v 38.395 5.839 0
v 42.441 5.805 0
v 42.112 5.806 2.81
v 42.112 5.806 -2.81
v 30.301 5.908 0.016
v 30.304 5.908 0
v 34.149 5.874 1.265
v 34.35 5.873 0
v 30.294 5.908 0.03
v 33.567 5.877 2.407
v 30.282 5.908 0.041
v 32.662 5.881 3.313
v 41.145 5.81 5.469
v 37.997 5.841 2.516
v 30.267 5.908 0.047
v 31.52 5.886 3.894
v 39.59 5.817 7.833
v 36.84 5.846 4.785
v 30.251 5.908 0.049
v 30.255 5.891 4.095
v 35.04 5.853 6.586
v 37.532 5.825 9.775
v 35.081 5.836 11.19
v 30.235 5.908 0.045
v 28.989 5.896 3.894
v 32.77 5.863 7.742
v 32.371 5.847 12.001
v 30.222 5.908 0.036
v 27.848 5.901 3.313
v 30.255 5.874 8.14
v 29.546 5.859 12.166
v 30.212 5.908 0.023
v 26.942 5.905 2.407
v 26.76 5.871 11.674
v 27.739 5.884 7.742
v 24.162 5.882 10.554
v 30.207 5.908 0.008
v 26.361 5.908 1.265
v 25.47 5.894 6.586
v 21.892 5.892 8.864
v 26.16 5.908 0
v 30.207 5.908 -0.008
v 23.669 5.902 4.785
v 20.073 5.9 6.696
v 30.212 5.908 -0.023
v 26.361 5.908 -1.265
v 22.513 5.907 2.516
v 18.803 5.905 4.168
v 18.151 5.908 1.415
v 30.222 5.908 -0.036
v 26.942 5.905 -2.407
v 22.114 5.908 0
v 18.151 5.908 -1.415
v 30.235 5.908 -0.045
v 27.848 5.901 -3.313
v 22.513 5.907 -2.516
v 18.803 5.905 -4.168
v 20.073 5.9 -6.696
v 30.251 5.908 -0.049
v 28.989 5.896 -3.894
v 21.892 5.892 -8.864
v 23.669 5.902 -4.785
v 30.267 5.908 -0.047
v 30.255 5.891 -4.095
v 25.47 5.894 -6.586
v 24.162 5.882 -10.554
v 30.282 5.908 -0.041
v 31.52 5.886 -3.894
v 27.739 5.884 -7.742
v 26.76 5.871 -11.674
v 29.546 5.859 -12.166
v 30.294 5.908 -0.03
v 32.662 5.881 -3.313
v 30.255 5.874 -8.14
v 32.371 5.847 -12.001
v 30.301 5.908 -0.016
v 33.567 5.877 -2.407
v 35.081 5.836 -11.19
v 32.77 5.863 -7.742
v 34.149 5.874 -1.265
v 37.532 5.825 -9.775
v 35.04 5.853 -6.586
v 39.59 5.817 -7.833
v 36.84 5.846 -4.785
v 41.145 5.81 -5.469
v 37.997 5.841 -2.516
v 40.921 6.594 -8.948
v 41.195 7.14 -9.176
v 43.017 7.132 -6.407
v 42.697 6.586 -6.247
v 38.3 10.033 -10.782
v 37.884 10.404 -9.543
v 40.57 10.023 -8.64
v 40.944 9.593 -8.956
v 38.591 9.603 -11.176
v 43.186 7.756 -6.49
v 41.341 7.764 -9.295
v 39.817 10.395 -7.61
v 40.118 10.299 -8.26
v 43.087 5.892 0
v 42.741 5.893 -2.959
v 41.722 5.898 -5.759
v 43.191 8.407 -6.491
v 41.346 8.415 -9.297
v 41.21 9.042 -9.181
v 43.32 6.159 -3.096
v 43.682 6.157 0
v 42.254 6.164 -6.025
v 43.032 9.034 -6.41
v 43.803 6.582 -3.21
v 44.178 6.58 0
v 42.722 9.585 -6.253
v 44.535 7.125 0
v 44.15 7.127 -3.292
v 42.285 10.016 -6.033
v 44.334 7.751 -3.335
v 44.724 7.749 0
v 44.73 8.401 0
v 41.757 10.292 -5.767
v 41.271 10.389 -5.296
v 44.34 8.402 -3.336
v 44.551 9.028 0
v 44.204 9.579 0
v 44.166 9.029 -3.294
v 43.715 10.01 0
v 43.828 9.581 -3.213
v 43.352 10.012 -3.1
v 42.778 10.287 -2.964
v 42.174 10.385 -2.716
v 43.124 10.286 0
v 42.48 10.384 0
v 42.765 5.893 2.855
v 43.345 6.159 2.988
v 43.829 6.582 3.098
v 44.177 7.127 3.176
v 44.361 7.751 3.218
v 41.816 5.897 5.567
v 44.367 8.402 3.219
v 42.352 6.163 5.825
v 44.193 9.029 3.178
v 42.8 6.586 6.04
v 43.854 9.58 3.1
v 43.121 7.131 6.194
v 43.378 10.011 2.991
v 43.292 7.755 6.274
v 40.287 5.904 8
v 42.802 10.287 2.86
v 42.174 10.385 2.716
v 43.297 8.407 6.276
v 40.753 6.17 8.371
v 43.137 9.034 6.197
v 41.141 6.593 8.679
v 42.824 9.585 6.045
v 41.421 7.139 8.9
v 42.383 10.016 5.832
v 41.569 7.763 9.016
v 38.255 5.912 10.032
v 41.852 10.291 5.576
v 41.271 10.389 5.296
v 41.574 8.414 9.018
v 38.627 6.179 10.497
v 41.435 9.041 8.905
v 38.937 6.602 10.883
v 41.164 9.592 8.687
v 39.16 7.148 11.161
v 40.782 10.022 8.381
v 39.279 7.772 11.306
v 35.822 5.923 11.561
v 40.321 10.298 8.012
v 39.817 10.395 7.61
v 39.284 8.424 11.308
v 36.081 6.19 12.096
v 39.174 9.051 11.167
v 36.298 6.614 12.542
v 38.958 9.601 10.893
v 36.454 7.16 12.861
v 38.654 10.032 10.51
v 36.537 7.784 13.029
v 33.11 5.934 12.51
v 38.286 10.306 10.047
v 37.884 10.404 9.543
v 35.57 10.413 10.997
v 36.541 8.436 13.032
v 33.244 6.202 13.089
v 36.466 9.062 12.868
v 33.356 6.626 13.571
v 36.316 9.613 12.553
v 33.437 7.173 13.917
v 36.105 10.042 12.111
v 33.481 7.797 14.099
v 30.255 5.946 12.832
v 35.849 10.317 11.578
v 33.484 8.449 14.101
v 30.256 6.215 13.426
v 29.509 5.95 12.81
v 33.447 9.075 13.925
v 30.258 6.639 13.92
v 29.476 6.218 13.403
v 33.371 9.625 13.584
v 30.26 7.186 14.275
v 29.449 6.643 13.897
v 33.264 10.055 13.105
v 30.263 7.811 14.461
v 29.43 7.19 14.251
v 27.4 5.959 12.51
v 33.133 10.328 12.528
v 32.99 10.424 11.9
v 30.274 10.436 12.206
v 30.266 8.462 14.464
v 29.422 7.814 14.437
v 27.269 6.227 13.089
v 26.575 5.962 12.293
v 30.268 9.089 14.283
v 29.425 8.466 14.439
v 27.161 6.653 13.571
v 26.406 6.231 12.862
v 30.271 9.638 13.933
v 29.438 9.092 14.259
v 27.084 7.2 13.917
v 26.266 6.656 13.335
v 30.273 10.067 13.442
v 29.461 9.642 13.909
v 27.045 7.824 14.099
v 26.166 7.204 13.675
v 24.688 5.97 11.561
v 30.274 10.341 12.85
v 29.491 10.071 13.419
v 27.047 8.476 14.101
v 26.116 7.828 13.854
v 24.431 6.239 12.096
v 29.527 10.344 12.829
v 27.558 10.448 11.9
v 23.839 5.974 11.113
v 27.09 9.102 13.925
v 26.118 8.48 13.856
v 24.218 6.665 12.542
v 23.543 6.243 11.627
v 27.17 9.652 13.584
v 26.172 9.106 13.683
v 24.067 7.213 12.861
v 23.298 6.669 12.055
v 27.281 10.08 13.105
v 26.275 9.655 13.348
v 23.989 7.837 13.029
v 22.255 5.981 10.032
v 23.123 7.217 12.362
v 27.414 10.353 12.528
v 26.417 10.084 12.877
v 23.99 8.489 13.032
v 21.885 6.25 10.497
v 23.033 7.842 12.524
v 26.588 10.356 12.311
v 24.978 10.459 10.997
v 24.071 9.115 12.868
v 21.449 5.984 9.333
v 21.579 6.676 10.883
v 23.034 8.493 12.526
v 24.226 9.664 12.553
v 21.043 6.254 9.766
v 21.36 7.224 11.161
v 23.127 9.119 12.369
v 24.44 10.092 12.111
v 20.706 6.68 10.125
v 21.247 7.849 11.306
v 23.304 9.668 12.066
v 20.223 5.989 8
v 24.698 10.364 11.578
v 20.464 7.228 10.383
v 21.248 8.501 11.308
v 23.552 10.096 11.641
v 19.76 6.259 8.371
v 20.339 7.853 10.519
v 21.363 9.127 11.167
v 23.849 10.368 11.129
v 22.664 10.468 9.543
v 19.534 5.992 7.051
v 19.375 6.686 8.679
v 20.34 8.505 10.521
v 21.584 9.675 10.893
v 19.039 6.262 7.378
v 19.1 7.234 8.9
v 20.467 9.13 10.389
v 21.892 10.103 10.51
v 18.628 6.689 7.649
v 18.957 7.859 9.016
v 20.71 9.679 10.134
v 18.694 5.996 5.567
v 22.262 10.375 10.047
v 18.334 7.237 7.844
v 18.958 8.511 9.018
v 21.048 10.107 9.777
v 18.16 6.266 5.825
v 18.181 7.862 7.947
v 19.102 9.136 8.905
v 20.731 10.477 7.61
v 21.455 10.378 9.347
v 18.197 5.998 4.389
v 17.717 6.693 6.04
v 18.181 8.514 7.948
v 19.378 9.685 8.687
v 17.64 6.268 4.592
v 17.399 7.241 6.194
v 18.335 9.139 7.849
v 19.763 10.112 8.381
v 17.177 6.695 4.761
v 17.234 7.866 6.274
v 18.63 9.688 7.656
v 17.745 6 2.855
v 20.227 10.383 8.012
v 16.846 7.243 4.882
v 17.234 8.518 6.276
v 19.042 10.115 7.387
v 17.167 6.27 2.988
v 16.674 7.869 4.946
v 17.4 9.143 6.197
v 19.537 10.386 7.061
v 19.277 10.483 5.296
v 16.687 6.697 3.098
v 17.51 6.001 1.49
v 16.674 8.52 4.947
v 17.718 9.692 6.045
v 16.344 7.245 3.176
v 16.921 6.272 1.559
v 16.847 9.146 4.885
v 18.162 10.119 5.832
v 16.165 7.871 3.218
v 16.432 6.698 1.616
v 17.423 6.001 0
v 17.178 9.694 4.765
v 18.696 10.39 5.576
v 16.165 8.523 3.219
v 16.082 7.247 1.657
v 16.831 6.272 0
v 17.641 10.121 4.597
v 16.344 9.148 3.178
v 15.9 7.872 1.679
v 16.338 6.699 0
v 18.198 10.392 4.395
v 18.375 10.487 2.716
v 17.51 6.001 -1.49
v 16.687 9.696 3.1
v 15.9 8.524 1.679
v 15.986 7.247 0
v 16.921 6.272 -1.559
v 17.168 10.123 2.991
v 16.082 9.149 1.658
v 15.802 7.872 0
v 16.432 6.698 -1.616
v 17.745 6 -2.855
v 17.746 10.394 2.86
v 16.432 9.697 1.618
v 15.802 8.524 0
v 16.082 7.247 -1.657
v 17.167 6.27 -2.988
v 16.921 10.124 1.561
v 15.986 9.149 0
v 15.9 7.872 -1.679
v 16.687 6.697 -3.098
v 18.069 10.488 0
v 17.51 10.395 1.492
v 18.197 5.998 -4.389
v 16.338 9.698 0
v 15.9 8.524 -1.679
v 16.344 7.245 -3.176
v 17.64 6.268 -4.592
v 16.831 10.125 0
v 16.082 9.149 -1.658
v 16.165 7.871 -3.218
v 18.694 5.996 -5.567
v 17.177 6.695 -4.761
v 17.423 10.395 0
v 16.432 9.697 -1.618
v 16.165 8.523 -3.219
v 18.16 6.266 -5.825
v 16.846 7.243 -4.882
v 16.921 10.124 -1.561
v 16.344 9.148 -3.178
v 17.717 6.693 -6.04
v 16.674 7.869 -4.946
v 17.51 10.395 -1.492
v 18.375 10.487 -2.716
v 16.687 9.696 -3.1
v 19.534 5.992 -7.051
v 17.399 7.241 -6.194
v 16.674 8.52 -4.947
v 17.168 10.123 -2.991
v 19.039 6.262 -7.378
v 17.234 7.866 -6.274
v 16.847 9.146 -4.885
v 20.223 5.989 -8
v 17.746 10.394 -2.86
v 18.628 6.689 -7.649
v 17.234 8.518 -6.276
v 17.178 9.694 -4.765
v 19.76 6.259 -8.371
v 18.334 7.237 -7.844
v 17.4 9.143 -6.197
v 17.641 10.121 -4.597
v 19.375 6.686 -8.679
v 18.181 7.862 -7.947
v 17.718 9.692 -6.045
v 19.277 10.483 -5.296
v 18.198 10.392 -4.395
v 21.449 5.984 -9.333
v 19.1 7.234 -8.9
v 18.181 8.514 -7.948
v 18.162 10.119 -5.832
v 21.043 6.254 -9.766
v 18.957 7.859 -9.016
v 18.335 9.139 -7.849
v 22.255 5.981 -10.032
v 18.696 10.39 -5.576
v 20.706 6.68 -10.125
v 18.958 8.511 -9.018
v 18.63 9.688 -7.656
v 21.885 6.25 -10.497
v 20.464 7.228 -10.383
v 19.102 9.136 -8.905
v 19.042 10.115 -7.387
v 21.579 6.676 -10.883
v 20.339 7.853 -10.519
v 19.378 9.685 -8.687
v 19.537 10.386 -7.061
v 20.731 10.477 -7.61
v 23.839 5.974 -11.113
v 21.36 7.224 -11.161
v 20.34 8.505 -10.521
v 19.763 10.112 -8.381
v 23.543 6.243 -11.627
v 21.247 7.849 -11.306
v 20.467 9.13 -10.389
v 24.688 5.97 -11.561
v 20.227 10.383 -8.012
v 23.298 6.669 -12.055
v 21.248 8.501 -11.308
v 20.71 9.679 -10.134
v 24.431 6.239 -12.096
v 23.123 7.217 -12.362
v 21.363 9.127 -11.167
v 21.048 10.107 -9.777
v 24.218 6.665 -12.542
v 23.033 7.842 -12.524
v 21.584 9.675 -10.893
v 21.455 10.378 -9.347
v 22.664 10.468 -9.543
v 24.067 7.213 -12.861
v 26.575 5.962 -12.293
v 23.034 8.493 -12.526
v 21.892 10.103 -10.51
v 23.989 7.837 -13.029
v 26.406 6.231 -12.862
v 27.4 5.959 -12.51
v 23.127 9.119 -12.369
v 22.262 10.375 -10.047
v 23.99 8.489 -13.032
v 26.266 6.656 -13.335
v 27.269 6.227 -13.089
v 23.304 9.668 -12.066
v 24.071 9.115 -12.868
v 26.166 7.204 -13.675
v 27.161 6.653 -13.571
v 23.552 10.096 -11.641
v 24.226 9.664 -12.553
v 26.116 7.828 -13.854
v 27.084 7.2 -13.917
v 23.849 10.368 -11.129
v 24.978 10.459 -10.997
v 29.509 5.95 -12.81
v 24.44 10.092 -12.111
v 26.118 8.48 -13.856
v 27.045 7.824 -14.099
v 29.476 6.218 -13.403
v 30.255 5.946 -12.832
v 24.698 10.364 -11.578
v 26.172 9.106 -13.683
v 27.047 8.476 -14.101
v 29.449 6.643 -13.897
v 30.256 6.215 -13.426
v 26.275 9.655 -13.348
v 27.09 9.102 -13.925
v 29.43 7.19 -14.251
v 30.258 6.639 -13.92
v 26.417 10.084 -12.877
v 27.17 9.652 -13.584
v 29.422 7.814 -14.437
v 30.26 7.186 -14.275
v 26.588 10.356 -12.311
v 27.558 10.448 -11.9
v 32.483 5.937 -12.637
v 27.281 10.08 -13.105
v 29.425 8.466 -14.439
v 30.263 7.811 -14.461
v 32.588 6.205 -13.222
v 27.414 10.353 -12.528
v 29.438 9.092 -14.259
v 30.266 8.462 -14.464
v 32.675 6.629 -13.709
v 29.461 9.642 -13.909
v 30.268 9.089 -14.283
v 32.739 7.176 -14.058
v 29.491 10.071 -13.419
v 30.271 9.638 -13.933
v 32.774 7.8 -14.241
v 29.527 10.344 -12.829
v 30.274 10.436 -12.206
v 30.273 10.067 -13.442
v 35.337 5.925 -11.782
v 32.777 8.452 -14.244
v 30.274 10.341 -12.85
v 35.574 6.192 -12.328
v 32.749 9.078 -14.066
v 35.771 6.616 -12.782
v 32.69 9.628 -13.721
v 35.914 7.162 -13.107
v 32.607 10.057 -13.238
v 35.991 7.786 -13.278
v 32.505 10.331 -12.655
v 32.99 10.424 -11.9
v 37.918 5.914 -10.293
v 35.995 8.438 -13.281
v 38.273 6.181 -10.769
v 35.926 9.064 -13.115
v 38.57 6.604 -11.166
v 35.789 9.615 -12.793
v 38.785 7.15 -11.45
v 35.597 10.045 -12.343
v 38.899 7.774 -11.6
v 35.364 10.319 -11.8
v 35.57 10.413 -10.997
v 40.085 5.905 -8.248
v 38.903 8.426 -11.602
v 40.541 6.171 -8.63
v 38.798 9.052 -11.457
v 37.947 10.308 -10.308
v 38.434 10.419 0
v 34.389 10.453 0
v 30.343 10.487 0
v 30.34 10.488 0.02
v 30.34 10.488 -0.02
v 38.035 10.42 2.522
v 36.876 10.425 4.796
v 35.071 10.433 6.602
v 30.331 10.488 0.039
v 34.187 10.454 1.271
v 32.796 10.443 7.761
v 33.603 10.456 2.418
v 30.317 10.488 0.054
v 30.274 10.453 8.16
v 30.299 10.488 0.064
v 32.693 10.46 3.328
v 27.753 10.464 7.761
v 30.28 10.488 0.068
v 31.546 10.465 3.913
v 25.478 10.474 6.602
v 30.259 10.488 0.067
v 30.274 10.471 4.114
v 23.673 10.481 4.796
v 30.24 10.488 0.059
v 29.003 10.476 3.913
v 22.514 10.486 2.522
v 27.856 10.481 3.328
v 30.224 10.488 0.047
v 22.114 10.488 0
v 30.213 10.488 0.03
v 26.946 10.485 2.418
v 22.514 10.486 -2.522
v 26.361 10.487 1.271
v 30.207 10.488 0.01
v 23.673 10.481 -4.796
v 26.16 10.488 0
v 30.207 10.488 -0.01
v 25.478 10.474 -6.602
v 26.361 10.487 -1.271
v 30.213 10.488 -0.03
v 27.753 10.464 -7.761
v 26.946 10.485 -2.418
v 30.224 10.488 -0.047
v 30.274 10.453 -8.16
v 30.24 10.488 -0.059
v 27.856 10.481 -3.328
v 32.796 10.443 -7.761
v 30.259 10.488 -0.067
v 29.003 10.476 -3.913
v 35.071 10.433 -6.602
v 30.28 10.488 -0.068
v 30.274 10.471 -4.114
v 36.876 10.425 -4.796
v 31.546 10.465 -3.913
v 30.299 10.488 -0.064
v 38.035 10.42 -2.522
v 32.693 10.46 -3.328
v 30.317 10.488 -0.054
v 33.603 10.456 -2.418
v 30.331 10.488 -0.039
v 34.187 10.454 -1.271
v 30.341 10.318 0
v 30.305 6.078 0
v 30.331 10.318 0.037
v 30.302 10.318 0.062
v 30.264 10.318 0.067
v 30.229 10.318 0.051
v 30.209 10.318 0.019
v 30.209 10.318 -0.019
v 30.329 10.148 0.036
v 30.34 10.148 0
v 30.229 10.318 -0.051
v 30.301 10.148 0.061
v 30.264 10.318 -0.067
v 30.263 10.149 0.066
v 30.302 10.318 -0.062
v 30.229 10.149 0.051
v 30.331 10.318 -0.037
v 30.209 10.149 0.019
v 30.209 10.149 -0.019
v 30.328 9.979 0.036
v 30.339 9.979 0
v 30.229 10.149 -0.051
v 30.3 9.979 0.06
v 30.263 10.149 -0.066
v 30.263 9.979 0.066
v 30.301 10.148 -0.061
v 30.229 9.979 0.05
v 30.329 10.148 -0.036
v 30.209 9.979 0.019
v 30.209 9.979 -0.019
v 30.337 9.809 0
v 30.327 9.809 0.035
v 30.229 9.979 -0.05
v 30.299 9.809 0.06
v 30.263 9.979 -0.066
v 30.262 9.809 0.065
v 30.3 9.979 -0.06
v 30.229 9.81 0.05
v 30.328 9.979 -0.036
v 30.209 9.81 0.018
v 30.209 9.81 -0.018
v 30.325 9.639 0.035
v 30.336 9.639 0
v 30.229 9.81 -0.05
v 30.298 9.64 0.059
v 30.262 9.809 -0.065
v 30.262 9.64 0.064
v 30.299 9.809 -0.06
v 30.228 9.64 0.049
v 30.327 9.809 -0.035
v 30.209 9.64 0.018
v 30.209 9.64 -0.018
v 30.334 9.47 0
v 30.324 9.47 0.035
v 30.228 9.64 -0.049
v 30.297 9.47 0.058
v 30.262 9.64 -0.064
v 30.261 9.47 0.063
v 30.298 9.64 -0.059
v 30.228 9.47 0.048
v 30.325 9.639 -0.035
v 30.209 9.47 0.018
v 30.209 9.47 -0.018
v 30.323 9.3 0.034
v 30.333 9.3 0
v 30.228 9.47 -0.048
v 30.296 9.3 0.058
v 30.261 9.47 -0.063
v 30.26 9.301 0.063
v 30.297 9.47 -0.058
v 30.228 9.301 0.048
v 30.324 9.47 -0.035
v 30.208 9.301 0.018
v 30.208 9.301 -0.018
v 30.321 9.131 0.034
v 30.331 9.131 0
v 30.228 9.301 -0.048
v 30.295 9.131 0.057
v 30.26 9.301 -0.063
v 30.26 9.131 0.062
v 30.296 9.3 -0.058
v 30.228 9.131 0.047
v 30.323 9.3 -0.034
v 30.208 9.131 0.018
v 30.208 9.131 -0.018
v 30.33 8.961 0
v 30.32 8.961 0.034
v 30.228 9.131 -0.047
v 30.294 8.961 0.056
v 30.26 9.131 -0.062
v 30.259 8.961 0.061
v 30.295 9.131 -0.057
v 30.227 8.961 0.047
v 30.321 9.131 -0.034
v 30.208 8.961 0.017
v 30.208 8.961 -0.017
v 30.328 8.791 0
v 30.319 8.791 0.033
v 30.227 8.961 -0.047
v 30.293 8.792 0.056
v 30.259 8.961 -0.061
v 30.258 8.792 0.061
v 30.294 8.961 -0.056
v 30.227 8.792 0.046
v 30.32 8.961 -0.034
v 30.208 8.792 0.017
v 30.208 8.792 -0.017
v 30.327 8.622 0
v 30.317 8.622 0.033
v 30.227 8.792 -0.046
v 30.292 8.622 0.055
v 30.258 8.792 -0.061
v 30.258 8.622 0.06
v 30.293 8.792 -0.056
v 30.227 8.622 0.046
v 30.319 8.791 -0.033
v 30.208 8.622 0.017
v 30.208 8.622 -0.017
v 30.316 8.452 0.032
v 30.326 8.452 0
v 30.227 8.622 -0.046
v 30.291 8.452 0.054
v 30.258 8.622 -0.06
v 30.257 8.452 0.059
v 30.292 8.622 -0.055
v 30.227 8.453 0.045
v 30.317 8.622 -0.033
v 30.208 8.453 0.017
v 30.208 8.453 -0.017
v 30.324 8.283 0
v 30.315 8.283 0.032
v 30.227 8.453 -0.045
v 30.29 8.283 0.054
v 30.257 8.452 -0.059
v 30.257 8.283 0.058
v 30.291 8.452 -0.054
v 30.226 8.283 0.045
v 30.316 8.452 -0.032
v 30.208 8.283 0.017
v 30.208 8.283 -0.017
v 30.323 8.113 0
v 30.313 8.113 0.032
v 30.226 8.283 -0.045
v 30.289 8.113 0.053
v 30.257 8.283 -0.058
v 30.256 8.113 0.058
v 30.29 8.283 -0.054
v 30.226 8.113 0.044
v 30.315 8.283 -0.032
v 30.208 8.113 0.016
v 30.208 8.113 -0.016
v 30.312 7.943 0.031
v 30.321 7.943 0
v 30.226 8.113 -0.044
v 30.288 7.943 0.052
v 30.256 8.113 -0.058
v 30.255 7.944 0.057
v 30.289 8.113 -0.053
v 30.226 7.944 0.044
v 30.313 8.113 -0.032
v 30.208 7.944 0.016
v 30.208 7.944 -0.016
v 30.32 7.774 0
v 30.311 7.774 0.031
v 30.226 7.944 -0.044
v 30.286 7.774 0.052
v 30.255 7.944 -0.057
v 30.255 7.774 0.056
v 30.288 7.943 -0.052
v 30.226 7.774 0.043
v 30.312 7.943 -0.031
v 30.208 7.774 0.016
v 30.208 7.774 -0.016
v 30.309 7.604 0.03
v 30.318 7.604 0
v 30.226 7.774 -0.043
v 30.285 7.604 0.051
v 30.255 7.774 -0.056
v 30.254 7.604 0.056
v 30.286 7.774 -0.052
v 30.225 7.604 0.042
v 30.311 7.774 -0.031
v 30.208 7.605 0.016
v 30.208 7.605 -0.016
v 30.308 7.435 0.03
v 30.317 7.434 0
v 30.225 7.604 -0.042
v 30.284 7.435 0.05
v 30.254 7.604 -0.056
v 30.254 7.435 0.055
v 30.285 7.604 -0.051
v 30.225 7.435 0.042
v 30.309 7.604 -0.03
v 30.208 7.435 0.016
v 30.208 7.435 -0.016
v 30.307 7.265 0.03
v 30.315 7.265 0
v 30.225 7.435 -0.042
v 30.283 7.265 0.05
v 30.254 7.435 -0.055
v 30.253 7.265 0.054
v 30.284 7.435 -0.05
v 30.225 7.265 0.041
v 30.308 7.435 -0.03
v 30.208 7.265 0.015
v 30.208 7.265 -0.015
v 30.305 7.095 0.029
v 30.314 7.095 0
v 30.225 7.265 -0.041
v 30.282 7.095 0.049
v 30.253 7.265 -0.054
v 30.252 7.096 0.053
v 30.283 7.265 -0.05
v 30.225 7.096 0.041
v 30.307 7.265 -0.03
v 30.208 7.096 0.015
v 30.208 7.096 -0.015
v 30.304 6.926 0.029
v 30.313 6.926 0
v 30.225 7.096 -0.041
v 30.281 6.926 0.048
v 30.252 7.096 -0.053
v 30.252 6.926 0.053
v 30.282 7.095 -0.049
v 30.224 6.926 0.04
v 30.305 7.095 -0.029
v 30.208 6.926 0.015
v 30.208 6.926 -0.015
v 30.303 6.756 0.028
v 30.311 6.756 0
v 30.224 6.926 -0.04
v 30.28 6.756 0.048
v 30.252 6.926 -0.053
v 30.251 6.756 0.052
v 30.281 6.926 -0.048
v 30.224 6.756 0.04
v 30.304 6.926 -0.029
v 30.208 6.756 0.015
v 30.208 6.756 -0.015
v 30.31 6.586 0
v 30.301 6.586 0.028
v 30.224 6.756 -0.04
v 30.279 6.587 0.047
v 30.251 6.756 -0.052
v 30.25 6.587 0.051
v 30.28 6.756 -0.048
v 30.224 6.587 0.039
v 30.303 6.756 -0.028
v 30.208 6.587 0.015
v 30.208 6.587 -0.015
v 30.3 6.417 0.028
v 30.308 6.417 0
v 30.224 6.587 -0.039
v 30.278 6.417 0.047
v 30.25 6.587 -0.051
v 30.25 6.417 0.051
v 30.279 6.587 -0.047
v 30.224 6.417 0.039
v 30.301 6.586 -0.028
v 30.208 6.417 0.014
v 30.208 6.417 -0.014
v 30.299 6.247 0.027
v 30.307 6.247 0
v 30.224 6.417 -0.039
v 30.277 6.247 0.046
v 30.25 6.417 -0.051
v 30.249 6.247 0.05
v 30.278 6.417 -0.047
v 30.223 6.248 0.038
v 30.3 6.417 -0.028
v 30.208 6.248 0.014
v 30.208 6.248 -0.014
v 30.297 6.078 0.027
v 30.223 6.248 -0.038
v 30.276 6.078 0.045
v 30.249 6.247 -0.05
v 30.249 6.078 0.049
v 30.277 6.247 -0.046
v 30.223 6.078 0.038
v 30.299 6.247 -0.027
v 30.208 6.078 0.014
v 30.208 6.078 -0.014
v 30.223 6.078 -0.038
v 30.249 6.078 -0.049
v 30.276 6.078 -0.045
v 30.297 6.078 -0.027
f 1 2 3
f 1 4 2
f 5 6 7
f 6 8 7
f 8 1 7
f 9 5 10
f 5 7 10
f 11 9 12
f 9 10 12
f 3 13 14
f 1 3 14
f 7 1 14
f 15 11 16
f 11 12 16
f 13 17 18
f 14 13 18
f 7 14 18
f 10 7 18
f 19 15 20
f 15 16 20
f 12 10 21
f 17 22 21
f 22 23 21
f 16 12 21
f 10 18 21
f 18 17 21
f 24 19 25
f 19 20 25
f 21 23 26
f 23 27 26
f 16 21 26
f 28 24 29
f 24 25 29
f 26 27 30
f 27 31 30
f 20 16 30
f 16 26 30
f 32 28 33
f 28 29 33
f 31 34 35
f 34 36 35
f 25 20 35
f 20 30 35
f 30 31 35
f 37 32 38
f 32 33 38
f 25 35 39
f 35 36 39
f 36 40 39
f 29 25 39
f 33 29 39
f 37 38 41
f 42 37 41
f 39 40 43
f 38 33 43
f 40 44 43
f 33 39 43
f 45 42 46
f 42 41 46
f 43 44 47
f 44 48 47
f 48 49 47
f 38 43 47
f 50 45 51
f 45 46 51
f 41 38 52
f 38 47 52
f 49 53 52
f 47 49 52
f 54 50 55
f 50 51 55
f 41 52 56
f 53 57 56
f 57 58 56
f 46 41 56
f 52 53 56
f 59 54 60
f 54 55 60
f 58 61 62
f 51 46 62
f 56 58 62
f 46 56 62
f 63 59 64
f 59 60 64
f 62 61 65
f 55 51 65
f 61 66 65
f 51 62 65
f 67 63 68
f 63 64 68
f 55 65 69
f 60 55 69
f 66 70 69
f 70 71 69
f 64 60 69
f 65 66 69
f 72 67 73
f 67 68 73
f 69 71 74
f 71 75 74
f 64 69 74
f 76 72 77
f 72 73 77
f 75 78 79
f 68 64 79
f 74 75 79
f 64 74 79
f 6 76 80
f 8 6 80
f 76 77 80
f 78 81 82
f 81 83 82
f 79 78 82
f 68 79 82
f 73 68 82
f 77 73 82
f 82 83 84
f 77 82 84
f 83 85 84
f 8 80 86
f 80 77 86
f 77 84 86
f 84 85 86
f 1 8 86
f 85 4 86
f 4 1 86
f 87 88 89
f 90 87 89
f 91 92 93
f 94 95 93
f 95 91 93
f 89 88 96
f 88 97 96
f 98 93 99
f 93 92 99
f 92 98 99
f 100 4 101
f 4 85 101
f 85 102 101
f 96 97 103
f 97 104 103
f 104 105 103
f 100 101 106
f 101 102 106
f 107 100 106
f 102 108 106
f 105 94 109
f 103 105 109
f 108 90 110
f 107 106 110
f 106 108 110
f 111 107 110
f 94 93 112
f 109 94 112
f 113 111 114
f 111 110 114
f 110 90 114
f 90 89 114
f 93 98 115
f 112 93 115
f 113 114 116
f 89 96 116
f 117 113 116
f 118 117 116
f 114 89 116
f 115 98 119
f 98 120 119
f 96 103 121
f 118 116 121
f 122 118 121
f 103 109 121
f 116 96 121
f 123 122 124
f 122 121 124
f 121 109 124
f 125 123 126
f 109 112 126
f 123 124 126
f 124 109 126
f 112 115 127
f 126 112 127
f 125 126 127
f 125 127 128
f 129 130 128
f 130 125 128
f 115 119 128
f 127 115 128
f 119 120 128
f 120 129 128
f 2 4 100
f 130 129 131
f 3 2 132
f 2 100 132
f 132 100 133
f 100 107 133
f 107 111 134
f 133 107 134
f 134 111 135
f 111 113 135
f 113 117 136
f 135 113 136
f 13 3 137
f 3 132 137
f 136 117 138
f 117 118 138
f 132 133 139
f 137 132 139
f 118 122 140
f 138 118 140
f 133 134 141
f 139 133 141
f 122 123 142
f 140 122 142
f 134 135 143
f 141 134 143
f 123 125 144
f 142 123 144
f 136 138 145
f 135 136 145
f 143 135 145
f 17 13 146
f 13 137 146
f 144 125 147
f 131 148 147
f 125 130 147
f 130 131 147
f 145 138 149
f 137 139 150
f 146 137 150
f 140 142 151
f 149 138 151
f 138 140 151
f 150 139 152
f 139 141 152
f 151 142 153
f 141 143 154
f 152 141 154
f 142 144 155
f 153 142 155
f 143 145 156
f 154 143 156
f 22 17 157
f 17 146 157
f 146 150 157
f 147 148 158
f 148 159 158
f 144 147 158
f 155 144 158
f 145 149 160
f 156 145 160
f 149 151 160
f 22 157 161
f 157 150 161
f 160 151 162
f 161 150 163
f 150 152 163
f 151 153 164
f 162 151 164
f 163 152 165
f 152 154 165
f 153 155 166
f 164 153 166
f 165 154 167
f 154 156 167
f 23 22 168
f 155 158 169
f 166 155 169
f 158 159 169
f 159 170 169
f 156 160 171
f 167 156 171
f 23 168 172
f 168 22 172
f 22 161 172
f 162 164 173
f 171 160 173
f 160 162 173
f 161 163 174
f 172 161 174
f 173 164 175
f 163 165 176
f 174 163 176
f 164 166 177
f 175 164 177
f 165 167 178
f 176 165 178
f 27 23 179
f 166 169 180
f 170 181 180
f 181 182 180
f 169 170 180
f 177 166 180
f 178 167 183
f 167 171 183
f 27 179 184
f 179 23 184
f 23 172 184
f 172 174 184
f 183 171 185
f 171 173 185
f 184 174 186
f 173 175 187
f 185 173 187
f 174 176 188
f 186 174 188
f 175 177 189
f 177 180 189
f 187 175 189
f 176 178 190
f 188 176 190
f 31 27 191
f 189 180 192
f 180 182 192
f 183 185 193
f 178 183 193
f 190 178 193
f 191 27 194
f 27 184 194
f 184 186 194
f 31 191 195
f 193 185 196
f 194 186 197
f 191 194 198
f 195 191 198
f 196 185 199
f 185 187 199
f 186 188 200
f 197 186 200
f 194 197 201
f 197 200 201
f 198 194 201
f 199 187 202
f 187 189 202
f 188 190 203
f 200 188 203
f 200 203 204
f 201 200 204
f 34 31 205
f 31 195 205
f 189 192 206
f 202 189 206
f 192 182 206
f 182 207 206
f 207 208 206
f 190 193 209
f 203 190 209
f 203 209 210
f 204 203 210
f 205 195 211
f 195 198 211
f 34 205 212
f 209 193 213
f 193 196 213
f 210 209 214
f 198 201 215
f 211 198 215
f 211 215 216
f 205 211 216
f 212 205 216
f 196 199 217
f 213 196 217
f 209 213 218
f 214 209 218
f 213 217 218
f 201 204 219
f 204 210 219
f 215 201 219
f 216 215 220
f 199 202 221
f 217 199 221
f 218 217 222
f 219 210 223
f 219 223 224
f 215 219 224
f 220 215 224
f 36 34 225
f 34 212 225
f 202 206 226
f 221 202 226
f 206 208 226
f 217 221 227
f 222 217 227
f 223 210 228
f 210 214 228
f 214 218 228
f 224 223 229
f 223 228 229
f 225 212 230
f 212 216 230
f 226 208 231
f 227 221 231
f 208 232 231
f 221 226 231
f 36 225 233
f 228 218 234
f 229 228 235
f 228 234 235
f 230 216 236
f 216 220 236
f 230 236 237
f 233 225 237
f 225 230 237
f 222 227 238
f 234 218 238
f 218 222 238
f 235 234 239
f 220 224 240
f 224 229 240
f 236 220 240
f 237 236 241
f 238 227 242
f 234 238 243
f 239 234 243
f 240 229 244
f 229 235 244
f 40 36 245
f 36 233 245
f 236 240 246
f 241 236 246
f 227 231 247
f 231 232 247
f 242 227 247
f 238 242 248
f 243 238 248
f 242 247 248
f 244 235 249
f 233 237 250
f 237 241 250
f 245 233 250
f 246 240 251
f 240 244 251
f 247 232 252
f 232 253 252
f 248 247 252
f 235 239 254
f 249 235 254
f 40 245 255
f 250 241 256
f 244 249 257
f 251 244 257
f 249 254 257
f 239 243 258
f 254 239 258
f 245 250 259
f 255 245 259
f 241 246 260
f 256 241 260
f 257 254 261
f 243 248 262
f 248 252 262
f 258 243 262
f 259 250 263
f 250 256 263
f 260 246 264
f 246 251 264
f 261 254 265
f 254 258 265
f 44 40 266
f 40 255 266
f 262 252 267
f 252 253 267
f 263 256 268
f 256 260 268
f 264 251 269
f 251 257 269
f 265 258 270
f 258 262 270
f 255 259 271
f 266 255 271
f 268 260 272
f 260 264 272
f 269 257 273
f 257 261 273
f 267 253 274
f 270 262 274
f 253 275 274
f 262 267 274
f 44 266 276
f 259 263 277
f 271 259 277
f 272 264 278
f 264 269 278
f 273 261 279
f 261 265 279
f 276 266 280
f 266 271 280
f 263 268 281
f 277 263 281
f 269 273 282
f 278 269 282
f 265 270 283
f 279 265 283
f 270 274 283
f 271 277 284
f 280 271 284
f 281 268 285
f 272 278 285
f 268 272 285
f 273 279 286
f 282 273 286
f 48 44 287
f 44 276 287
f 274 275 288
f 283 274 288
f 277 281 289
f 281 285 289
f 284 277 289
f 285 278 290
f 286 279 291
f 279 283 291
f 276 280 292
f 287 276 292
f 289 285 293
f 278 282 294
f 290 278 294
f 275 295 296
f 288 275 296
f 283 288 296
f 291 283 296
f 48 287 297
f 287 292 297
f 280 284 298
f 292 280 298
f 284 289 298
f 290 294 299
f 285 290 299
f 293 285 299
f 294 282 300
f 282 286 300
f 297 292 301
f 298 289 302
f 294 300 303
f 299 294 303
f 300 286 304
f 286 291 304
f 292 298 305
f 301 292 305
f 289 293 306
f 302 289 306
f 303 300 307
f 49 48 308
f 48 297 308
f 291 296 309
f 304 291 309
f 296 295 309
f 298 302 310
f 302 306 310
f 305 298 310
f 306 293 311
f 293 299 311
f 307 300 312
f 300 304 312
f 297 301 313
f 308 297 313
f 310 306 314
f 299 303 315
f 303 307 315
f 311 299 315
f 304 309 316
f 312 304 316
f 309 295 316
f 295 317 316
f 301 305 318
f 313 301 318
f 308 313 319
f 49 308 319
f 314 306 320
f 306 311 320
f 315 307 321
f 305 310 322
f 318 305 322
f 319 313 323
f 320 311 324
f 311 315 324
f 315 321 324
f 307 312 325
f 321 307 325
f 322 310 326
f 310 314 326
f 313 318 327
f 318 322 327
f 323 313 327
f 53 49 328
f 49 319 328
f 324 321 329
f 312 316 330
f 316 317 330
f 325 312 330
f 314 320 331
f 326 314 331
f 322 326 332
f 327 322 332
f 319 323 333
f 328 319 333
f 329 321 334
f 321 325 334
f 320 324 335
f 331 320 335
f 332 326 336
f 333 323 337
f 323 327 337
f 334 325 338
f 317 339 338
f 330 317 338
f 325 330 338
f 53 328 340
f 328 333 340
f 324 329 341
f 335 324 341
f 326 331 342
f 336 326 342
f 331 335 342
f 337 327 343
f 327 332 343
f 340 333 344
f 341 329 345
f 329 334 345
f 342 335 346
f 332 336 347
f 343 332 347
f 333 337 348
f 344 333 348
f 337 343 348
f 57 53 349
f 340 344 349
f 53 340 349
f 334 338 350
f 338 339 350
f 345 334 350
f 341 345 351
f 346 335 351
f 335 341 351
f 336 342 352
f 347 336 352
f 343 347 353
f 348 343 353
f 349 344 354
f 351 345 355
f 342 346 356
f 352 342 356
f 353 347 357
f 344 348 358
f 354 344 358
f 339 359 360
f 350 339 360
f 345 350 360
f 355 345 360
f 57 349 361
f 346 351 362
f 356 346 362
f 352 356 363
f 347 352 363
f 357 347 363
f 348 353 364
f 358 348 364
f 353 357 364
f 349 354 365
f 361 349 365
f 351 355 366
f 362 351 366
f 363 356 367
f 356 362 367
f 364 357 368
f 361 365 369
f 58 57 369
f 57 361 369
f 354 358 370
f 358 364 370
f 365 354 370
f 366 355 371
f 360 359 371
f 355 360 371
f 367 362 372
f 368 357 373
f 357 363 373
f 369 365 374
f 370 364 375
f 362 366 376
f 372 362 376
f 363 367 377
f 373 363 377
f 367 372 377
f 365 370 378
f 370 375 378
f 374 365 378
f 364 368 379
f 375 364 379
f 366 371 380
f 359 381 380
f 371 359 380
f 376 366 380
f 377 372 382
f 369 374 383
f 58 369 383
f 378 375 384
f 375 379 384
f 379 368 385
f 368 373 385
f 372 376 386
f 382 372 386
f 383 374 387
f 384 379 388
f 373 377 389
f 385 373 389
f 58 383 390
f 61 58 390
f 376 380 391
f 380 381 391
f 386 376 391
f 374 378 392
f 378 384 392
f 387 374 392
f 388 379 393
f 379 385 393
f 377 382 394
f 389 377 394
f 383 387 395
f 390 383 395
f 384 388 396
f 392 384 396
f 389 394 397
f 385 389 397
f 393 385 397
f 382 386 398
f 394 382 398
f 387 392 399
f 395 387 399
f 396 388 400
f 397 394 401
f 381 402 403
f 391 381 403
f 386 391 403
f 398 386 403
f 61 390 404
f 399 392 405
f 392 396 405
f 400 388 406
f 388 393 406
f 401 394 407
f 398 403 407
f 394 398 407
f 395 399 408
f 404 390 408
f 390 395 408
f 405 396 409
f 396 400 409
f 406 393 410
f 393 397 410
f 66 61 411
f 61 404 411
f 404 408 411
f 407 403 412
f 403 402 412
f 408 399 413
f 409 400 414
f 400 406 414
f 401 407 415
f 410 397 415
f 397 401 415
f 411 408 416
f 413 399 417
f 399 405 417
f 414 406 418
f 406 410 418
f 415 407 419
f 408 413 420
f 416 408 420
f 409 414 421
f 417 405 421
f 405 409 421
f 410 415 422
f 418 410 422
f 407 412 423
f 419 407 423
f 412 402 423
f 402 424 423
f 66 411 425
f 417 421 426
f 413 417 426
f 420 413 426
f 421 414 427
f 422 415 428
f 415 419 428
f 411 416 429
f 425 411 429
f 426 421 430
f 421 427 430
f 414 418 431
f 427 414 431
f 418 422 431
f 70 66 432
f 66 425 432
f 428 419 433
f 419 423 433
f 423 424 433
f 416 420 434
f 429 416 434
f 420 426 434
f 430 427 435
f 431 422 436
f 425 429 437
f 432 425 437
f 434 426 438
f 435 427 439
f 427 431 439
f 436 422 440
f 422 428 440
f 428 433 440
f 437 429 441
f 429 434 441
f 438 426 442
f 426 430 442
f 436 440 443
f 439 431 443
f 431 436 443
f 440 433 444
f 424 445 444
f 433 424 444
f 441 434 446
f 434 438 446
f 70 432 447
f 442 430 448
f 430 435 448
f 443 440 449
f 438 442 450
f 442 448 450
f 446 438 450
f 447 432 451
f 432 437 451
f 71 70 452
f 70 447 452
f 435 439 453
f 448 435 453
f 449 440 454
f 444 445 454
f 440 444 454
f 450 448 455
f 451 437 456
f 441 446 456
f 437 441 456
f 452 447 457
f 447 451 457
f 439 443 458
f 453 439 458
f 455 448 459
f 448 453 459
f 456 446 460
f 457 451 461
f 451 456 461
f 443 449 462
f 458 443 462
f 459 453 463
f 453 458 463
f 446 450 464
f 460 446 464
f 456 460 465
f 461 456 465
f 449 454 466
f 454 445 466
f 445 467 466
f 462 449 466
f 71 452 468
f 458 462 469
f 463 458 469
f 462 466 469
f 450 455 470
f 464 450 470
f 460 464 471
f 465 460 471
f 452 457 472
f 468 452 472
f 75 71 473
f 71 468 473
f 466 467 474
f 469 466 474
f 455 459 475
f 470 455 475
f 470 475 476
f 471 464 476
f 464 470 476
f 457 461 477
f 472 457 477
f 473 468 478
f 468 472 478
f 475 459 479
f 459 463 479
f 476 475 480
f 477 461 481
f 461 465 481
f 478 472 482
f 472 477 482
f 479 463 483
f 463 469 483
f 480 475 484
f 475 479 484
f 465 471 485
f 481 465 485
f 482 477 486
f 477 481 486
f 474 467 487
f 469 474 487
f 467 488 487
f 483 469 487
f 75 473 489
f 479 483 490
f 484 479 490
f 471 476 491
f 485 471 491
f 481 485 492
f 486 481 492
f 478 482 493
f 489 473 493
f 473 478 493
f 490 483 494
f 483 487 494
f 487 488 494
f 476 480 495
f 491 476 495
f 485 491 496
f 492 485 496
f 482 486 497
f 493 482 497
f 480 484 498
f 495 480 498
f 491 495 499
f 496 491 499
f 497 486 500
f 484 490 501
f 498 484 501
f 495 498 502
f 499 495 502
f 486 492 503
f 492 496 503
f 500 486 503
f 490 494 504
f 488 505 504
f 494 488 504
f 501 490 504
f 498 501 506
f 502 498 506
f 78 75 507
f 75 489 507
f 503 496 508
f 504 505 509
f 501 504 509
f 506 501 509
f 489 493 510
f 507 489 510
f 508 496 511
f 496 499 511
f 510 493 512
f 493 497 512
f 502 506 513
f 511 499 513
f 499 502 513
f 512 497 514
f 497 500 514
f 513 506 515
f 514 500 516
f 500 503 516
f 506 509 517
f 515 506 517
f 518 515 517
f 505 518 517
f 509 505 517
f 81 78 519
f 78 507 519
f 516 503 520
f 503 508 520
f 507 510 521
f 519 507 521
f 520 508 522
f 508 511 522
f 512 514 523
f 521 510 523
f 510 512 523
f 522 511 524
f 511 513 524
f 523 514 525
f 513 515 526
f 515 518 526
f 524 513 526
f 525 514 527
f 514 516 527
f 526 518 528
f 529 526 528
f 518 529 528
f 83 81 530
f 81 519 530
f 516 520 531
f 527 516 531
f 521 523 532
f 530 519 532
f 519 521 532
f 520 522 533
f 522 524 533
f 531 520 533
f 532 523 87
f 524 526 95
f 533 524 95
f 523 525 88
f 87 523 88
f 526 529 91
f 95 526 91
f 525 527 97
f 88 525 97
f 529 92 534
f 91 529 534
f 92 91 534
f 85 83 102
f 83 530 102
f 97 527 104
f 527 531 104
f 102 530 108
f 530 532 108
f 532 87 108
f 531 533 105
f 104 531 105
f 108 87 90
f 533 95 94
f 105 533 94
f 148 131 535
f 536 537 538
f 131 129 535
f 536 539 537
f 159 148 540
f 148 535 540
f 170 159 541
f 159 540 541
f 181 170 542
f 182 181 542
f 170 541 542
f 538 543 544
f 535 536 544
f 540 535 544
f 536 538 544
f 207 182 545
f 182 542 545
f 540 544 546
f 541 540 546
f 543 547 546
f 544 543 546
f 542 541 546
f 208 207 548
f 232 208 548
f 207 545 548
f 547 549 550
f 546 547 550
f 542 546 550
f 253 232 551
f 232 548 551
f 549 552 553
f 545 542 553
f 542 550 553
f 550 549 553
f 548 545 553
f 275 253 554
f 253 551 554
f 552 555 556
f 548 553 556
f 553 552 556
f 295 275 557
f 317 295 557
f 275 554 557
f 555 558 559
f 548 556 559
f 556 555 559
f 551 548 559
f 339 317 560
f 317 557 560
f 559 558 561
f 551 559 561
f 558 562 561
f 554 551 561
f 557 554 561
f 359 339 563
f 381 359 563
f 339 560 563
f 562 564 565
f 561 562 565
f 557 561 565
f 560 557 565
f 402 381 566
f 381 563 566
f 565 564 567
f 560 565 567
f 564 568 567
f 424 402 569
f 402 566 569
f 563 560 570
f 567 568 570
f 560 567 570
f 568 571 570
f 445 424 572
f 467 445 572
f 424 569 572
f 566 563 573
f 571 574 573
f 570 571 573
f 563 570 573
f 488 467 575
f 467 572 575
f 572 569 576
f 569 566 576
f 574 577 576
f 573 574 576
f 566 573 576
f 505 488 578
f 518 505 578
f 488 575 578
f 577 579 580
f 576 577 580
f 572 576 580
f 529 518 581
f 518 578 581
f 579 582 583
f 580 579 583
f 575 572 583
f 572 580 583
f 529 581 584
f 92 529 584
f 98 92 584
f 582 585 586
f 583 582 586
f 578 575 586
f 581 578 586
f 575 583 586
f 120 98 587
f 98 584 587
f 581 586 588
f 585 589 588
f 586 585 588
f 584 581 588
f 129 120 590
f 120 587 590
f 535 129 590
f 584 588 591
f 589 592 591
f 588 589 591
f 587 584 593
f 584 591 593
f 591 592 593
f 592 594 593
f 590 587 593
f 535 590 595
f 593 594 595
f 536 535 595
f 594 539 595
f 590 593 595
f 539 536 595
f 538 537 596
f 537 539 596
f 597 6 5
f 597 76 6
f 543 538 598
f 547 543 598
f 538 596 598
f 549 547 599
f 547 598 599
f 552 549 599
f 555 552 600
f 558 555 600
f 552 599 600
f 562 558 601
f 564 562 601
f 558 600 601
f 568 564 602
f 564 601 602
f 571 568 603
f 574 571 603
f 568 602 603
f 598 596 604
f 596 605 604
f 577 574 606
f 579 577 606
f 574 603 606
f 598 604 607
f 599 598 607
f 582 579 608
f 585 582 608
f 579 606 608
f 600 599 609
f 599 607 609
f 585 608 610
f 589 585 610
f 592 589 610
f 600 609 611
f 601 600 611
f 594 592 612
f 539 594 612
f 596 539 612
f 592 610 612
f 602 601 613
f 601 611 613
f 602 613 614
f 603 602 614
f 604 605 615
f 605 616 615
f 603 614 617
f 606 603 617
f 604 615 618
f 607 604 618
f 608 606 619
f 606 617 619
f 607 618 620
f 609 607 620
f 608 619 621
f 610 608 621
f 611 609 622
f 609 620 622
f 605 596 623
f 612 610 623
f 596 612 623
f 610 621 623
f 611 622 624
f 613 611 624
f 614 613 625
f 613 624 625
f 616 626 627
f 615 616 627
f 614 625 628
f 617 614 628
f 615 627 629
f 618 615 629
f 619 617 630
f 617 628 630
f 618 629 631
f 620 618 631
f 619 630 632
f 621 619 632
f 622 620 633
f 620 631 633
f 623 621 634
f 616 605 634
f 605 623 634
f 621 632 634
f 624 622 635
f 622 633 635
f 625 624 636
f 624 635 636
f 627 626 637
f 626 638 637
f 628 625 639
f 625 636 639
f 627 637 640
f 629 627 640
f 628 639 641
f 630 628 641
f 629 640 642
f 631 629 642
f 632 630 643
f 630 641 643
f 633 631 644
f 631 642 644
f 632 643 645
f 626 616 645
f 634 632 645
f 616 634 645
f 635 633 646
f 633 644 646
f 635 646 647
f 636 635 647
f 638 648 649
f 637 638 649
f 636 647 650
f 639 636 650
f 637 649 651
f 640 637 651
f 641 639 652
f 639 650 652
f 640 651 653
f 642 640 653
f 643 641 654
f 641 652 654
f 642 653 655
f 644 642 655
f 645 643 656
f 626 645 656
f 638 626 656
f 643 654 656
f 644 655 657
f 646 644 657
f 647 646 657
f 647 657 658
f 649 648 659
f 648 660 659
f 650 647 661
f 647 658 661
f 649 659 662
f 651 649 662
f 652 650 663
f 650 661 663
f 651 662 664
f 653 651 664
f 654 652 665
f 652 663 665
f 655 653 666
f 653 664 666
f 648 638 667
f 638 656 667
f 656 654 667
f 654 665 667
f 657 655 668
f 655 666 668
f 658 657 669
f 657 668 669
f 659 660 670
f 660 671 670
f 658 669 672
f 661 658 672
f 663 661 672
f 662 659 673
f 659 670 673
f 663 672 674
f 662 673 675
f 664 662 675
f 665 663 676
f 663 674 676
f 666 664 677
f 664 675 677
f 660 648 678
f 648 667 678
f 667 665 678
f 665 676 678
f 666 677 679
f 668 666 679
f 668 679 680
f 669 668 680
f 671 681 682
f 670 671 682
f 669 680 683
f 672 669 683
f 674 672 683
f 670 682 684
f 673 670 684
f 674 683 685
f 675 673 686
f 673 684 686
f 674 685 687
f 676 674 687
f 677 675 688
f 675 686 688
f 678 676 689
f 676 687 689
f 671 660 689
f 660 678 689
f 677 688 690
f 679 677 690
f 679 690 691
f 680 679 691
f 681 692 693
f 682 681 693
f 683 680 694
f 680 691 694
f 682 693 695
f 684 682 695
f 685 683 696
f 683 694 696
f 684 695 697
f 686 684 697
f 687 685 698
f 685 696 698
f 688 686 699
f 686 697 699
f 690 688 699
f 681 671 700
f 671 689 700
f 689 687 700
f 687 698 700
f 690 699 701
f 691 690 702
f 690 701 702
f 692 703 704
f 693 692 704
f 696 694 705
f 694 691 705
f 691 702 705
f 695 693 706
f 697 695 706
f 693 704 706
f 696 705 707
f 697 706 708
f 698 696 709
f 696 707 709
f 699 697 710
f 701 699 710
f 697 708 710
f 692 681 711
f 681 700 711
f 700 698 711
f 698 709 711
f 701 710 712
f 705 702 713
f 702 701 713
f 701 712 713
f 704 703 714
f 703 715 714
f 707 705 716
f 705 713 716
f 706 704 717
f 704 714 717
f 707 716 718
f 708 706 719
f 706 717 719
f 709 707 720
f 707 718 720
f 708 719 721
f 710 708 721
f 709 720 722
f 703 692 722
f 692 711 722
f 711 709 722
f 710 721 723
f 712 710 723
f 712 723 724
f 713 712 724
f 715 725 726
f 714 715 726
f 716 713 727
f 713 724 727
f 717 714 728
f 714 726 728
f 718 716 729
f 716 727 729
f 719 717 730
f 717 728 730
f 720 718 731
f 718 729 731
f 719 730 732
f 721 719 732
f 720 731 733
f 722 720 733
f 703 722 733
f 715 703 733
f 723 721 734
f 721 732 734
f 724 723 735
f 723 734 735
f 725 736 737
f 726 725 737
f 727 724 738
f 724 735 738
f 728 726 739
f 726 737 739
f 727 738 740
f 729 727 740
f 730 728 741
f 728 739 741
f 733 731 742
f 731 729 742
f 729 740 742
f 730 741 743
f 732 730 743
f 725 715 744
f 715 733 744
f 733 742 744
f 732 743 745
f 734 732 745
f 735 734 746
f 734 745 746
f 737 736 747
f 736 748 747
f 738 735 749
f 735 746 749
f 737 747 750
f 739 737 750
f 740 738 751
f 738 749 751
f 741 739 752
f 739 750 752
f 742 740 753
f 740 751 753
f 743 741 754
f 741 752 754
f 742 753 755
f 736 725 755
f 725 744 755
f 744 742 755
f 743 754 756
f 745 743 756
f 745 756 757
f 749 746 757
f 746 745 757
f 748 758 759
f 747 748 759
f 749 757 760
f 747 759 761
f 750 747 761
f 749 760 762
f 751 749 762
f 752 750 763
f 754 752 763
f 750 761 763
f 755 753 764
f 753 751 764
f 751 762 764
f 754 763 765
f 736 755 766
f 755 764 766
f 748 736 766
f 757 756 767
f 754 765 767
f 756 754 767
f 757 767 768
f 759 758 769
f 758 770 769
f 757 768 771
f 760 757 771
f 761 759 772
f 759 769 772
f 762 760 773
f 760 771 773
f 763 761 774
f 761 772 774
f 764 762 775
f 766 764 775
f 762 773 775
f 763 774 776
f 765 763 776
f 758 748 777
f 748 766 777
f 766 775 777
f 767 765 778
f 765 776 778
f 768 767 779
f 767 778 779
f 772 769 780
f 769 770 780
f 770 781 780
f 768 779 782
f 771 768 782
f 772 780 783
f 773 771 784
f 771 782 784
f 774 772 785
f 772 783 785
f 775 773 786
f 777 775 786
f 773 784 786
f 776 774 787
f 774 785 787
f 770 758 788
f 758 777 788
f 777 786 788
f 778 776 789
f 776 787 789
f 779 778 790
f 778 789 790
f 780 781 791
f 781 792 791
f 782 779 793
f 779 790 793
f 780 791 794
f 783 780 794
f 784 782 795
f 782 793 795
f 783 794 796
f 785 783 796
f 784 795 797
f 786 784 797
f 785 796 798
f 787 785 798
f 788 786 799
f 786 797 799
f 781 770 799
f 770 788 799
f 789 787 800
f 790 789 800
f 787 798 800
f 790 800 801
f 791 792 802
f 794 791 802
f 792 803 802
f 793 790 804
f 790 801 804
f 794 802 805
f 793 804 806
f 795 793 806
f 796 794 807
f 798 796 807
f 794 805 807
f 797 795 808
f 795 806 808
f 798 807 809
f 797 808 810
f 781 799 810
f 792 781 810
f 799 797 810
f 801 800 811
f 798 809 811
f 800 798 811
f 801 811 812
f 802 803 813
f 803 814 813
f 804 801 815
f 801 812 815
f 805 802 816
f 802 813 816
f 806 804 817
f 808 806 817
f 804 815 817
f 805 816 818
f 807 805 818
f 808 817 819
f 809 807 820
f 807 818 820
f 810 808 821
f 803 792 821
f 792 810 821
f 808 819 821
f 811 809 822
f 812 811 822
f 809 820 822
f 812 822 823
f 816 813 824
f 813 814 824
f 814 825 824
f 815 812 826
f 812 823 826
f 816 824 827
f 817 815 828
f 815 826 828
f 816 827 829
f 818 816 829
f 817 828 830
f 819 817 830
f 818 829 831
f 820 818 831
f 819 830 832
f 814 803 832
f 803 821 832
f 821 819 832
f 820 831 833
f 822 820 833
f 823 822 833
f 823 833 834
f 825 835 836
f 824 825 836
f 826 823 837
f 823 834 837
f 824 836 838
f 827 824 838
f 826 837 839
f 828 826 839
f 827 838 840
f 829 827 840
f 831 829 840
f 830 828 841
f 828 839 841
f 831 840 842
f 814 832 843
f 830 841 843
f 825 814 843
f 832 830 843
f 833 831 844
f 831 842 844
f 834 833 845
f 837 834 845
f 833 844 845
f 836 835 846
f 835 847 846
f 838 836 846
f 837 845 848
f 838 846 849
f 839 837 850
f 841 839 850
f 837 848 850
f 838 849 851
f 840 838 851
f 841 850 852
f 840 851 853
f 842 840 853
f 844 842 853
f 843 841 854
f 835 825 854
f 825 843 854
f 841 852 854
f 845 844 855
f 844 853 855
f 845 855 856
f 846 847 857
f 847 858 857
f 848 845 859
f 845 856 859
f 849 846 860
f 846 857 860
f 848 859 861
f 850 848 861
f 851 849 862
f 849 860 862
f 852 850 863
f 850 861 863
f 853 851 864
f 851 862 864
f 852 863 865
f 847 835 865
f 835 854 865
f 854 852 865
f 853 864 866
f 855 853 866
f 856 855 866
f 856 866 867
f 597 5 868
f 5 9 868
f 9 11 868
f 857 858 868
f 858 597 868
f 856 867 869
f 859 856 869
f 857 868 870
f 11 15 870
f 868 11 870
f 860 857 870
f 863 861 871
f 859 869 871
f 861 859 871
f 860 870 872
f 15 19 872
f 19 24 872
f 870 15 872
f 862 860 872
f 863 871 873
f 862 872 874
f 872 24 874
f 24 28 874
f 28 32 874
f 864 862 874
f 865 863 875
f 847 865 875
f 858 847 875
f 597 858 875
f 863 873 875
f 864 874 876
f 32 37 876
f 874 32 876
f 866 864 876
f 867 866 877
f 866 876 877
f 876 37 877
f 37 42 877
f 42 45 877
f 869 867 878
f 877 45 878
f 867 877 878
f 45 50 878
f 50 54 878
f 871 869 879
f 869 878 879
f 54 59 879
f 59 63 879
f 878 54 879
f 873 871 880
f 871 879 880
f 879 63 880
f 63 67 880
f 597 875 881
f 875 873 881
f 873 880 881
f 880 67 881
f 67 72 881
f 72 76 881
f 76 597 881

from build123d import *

# Parameters (mm, degrees)
SCALE1_SCALE = 0.5
SCALE2_SCALE = 0.3
SCALE3_SCALE = 0.5
SCALE5_SCALE = 5


with BuildPart() as part:
    # Sketch1 → Revolve1 (revolve)
    with BuildSketch(Plane.XY, mode=Mode.PRIVATE) as revolve1_sk:
        with BuildLine():
            Line((-2.258036414, 14.369211187), (30.108325784, 14.369211187))
            Line((30.108325784, 14.369211187), (30.108325784, 2.156708547))
            Line((30.108325784, 2.156708547), (-2.258036414, 2.156708547))
            ThreePointArc((-2.258036414, 2.156708547), (-8.364287734, 8.262959867), (-2.258036414, 14.369211187))
        make_face()
    revolve(revolve1_sk.sketch.rotate(Axis((30.290952568, 14.369211187, 0), (-0.004261675171453159, -0.9999909190211345, 0)), 180), axis=Axis((30.290952568, 14.369211187, 0), (-0.004261675171453159, -0.9999909190211345, 0)))


with BuildPart() as part_1:
    # Scale1: scaled about (30.264488075, 8.159387293, 0)
    add(part.part.scale(SCALE1_SCALE).moved(Location((15.132244037, 4.079693646, 0))))


with BuildPart() as part_2:
    # Scale2: scaled about (30.264488075, 8.159387293, 0)
    add(part_1.part.scale(SCALE2_SCALE).moved(Location((21.185141652, 5.711571105, 0))))


with BuildPart() as part_3:
    # Scale3: scaled about (30.264488075, 8.159387293, 0)
    add(part_2.part.scale(SCALE3_SCALE).moved(Location((15.132244037, 4.079693646, 0))))


with BuildPart() as part_4:
    # Scale5: scaled about (30.264488075, 8.159387293, 0)
    add(part_3.part.scale(SCALE5_SCALE).moved(Location((-121.0579523, -32.637549172, 0))))


solid = part_4.part
